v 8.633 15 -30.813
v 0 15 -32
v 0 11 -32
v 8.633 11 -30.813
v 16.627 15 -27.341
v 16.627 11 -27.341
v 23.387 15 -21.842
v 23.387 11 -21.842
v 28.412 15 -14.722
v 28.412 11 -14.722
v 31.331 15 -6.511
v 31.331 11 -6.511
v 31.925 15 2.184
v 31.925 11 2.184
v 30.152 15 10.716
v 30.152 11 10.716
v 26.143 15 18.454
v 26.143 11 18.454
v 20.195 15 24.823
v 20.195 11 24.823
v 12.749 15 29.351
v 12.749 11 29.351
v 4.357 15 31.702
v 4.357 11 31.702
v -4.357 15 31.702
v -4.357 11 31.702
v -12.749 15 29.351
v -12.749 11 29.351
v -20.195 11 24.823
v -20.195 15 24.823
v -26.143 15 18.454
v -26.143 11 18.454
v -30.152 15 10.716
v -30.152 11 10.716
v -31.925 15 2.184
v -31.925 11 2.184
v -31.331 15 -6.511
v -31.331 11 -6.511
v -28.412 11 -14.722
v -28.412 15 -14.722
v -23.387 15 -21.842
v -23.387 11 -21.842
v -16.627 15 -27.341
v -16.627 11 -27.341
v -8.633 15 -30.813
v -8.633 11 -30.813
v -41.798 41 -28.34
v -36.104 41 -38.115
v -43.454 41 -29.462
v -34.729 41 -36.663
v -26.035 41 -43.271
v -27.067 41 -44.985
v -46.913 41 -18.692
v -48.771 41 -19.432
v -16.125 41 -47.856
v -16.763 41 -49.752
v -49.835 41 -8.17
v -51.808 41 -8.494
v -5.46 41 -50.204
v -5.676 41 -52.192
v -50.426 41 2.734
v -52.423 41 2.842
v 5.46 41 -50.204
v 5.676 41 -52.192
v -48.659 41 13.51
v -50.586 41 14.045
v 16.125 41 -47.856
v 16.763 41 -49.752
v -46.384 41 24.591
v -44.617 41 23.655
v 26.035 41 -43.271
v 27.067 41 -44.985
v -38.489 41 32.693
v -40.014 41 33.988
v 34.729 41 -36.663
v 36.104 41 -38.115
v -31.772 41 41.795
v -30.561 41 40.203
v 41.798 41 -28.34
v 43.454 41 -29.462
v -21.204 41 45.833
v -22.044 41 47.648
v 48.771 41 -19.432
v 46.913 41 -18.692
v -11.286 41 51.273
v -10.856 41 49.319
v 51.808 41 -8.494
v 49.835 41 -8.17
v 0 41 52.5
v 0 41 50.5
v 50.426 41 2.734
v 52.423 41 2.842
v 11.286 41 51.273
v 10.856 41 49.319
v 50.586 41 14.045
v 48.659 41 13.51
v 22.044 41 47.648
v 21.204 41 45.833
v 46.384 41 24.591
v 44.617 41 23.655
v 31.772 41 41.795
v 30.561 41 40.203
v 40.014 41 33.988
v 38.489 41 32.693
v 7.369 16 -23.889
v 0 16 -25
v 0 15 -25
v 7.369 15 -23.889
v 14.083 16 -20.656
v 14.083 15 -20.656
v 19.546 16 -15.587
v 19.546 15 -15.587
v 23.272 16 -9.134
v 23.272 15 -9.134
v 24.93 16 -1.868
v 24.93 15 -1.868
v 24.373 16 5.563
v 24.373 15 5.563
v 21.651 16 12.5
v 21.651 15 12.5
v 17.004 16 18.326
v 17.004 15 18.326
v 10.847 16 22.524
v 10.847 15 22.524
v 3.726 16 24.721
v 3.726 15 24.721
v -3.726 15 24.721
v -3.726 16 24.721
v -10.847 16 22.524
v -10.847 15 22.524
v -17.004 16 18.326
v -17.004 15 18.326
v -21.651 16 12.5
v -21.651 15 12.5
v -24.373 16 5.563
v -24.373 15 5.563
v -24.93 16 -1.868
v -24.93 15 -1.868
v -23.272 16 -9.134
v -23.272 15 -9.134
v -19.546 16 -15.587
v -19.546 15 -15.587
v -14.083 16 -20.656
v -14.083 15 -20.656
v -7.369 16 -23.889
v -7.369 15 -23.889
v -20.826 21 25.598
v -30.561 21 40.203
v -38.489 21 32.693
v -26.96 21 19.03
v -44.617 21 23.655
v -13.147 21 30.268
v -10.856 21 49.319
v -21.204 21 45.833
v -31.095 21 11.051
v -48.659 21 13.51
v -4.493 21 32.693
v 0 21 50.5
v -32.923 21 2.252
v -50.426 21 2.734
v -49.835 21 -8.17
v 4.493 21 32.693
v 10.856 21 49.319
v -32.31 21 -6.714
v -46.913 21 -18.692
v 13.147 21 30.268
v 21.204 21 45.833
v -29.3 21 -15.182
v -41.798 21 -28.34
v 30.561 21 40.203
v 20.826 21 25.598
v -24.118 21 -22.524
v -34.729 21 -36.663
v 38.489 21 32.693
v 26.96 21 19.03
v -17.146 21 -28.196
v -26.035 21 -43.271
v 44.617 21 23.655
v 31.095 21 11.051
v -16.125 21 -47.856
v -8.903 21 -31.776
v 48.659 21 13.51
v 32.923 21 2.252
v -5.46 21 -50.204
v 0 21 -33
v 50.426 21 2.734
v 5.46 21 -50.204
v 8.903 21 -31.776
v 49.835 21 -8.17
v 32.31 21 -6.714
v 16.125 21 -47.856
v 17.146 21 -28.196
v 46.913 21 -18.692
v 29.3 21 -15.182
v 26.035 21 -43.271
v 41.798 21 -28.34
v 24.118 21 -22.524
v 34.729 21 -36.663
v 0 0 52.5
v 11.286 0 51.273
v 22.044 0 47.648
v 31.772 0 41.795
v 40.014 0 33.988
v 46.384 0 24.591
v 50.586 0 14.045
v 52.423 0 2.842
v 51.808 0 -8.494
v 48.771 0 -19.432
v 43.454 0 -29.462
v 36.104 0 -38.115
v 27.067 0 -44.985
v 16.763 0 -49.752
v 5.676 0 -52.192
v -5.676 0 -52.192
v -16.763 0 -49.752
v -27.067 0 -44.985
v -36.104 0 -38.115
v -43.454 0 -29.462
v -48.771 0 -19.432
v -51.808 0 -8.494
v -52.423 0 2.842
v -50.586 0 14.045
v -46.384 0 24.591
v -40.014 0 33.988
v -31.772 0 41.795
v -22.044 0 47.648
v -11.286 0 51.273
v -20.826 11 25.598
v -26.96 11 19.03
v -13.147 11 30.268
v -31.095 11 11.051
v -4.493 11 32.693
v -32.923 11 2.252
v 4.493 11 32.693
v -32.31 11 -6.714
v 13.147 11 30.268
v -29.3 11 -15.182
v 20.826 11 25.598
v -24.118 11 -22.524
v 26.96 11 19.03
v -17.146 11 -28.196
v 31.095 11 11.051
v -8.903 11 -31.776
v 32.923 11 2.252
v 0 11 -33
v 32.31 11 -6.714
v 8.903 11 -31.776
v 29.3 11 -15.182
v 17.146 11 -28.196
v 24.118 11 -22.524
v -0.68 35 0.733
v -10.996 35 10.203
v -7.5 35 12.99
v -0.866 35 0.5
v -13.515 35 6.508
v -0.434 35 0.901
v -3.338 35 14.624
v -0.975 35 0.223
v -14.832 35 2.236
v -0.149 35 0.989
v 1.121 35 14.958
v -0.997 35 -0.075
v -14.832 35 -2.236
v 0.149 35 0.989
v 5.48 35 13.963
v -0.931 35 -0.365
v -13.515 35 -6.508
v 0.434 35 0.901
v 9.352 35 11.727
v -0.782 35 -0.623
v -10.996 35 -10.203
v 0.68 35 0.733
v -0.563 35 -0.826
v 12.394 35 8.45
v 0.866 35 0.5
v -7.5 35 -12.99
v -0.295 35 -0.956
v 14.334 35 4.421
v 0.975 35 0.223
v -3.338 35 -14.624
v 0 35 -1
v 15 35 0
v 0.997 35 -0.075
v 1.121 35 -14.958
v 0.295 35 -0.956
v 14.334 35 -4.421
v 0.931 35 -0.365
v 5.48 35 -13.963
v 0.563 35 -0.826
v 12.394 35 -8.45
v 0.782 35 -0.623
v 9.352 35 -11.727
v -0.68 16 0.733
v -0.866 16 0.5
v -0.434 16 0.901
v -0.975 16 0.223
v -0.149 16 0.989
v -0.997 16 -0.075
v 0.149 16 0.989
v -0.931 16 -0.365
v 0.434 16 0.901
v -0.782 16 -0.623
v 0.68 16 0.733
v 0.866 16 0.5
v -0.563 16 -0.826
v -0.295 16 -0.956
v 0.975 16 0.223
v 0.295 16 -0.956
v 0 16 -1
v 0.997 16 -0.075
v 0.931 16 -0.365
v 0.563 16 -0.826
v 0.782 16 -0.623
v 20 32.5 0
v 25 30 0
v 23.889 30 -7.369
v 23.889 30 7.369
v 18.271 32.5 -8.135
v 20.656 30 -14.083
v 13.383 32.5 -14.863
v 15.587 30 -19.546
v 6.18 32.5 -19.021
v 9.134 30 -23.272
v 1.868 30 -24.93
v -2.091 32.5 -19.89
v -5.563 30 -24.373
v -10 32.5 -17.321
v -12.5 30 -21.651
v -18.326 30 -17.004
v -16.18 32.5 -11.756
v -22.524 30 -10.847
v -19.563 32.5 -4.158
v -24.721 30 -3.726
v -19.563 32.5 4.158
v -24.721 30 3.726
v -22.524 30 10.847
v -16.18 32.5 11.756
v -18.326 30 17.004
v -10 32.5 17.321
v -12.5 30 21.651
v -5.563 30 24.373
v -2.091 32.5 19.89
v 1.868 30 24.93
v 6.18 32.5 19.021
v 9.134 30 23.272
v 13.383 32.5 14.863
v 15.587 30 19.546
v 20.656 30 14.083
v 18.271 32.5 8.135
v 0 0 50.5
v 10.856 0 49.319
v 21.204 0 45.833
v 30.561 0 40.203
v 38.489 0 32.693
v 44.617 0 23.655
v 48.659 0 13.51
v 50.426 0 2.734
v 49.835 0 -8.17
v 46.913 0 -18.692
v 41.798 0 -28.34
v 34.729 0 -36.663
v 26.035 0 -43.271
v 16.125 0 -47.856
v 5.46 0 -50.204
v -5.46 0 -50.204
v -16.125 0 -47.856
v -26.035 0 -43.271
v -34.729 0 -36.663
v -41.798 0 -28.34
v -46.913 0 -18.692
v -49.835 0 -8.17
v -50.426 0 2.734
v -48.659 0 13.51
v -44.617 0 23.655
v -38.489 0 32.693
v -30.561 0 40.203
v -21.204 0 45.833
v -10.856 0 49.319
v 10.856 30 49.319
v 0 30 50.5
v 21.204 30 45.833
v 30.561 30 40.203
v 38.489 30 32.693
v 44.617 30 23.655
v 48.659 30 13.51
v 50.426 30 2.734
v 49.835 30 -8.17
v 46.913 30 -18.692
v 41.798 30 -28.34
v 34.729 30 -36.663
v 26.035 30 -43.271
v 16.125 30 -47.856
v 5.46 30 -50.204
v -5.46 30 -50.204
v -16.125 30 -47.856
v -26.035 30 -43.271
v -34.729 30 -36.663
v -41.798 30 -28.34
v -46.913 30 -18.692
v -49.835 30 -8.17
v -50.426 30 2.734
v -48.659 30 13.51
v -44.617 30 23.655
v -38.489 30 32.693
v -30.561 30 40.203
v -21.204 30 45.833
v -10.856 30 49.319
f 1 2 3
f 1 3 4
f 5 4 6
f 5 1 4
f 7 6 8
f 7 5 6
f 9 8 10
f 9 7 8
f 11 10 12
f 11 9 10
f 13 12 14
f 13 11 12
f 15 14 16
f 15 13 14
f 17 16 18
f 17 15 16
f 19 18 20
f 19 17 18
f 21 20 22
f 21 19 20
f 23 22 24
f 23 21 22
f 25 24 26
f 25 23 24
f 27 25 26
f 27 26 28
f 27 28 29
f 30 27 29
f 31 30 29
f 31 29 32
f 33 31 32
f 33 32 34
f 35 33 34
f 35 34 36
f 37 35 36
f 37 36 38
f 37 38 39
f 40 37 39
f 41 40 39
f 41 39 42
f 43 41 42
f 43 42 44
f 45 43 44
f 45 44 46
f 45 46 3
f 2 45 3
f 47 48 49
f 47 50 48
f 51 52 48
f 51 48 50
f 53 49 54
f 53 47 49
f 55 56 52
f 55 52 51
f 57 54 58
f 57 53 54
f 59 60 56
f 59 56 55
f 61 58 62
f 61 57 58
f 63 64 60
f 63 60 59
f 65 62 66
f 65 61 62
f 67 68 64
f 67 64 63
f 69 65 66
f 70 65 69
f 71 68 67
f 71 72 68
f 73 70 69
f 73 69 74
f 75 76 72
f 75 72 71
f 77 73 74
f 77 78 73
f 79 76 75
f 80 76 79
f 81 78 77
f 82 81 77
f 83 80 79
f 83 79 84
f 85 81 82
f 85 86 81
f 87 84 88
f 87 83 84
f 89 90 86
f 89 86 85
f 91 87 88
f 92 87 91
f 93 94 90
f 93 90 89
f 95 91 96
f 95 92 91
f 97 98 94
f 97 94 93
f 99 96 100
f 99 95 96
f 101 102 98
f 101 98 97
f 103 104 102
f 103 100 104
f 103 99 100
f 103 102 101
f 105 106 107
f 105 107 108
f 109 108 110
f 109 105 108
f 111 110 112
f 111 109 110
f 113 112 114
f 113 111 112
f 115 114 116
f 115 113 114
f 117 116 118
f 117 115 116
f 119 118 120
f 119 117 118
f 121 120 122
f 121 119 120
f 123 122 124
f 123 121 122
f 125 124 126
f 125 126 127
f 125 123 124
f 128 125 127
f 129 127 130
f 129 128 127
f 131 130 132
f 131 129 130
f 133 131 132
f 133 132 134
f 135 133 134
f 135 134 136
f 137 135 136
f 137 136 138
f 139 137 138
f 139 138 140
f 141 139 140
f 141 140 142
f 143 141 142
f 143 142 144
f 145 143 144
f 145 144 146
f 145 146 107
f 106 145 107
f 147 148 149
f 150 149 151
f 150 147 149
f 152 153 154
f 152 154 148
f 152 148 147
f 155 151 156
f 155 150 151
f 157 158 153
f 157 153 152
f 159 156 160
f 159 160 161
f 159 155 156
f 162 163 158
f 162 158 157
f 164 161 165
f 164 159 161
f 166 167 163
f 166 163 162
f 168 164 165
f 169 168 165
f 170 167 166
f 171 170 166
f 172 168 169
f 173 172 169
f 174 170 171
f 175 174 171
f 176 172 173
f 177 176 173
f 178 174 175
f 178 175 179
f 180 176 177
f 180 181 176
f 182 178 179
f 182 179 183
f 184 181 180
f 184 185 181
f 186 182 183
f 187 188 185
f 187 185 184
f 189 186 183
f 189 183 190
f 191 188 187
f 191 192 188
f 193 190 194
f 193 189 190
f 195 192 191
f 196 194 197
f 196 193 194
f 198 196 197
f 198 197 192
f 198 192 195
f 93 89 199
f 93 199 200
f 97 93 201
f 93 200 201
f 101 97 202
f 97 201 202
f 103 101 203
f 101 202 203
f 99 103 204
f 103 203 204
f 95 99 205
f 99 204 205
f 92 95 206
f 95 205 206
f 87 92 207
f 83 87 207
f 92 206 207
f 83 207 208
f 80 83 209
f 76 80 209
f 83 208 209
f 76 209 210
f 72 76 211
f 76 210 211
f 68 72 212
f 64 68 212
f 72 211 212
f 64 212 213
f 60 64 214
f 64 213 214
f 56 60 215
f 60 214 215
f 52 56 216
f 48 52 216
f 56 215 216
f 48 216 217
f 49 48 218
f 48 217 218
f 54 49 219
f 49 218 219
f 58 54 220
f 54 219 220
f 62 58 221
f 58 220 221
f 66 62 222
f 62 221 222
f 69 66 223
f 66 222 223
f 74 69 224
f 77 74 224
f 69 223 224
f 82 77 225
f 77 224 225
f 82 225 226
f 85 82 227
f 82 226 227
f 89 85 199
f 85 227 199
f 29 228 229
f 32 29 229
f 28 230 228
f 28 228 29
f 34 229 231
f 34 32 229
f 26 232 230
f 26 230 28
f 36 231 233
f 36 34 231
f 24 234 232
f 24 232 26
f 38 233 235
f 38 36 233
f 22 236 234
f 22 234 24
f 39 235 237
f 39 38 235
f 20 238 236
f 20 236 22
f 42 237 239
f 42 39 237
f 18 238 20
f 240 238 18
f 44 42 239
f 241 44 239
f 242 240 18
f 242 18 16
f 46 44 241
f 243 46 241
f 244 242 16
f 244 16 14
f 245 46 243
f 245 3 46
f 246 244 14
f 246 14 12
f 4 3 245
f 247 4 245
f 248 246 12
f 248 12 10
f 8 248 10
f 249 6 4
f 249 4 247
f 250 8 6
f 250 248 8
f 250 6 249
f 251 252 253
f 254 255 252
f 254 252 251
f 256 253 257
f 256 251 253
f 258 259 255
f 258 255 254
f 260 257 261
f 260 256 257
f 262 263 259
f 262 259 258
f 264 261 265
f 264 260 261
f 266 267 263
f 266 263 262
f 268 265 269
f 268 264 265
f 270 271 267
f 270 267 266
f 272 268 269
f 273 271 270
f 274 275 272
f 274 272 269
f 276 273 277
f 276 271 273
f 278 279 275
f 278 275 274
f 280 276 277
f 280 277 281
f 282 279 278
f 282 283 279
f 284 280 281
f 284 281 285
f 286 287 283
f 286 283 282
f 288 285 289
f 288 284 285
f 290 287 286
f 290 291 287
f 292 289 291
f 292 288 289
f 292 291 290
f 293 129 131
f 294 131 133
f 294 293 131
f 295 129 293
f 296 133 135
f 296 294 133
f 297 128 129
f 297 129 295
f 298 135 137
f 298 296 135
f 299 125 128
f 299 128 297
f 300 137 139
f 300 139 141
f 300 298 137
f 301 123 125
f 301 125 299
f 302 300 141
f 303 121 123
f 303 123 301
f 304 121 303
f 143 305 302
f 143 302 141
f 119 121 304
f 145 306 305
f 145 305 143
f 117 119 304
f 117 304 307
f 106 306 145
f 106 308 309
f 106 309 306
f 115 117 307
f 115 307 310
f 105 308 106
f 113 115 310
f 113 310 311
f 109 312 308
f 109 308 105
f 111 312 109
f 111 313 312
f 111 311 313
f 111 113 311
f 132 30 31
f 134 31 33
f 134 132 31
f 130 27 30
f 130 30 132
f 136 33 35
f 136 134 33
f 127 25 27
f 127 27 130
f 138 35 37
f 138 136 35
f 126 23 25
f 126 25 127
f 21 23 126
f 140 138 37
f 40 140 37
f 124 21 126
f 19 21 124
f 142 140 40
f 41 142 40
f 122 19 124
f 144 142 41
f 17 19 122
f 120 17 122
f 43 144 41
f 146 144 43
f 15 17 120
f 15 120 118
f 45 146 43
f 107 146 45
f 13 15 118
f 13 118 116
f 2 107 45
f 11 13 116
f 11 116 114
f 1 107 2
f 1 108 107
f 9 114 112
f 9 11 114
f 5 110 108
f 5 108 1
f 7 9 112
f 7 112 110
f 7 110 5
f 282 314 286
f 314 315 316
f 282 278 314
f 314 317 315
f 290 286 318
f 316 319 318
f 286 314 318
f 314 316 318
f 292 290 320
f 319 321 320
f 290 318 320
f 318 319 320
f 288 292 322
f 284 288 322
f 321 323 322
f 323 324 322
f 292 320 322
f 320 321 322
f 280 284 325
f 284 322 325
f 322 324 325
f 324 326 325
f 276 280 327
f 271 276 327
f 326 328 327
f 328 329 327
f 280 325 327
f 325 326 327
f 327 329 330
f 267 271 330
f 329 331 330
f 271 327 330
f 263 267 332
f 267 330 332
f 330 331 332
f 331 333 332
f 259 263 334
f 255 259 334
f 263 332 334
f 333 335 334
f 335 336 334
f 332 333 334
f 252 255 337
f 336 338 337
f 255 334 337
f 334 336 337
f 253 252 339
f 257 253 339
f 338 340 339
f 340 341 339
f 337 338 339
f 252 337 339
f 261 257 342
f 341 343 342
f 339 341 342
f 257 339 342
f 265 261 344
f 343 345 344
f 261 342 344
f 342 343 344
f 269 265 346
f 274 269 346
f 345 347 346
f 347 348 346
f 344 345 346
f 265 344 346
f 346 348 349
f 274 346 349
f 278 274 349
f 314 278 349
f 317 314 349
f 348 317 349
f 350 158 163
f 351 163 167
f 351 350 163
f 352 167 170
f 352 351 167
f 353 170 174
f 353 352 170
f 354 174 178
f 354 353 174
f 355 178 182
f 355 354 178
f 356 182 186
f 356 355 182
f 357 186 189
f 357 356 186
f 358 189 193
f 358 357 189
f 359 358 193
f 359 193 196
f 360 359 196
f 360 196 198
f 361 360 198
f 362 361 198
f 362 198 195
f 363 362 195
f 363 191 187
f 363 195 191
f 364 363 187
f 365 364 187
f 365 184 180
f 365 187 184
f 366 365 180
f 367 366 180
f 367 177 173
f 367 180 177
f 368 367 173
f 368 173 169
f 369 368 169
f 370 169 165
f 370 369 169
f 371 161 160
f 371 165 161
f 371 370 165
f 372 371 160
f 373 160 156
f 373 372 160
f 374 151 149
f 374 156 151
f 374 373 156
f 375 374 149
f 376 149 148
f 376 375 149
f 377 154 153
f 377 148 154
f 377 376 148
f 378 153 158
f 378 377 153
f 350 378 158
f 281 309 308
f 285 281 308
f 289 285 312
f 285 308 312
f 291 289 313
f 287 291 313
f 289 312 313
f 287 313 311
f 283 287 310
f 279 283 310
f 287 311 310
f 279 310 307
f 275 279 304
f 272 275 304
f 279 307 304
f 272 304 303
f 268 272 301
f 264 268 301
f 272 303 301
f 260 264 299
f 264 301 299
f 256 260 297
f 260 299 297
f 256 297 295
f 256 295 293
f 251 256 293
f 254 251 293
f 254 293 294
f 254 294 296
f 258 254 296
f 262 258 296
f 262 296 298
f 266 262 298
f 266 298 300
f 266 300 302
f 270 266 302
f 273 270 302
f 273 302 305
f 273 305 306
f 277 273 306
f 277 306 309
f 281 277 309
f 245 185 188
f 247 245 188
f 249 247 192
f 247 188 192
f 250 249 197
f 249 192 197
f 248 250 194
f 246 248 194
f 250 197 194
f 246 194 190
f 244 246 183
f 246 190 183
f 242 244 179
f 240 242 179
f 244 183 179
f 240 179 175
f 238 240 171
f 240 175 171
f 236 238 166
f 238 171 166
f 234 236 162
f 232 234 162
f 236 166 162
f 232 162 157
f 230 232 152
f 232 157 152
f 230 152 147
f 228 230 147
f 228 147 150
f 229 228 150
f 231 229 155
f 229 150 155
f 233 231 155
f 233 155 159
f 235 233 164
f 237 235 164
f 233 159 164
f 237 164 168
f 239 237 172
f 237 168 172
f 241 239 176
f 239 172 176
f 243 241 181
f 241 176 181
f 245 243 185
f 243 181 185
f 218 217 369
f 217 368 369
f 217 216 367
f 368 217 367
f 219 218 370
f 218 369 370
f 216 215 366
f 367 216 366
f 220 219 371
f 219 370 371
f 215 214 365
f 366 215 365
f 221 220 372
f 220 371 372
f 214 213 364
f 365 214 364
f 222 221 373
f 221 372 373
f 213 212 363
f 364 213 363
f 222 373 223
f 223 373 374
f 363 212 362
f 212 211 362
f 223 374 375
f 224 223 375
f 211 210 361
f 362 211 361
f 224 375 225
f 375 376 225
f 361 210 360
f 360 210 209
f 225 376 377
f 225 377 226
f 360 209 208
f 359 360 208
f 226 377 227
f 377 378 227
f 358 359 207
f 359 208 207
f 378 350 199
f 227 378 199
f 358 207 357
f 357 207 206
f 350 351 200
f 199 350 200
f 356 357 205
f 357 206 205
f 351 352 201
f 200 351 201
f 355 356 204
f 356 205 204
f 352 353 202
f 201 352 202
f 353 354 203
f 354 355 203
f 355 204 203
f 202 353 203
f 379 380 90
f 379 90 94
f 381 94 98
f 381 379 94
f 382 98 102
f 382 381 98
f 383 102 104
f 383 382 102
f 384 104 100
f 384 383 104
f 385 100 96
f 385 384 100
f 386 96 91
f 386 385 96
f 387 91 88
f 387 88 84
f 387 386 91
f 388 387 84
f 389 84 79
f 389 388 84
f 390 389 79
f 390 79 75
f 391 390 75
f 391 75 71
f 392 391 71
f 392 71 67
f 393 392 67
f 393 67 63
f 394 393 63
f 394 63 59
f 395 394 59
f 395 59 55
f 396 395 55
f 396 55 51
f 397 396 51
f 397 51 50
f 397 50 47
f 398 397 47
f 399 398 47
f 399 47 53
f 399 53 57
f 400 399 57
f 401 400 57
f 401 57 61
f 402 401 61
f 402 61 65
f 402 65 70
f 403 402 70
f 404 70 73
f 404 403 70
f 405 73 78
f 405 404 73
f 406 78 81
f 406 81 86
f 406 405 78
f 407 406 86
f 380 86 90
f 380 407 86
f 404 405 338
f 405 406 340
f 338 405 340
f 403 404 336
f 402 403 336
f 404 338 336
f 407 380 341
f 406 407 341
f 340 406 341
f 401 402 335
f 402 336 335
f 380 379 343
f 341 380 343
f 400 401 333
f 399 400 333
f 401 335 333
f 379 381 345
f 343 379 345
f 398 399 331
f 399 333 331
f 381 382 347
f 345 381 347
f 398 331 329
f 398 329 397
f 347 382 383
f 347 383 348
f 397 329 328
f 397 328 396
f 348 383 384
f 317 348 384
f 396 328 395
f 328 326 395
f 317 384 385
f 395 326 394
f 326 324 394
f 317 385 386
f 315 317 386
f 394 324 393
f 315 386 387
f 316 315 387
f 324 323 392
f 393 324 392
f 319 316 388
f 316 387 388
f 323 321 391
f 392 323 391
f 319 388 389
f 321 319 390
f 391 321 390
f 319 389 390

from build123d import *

# Parameters (mm, degrees)
SKETCH1_R                          = 52.5
SKETCH1_R_2                        = 50.5
MAIN_BLADE_CASE_EXTRUDE_DEPTH      = 41
SKETCH2_R                          = 50.5
EXTRUDE_FOR_GOBLET_TO_SIT_ON_DEPTH = 9
SKETCH5_R                          = 15
SKETCH4_R                          = 25
SKETCH8_R                          = 33
SKETCH8_R_2                        = 32
MAIN_LOWER_EXTRUDE_DEPTH           = 10
SKETCH9_R                          = 32
SKETCH9_R_2                        = 25
SECOND_LOWER_EXTRUDE_DEPTH         = 6
SKETCH12_R                         = 25
THIRD_LOWER_EXTRUDE_DEPTH          = 5
SKETCH13_R                         = 1
HOLE_FOR_SCREW_BLADE_CASING_DEPTH  = 89


with BuildPart() as part:
    # Sketch1 → Main Blade Case Extrude (new body)
    with BuildSketch(Plane(origin=(0, 0, 0), x_dir=(1, 0, 0), z_dir=(0, 1, 0))):
        with Locations(Location((0, 0, 0), (0, 0, 270))):
            Circle(SKETCH1_R)
        with Locations(Location((0, 0, 0), (0, 0, 270))):
            Circle(SKETCH1_R_2, mode=Mode.SUBTRACT)
    extrude(amount=MAIN_BLADE_CASE_EXTRUDE_DEPTH)

    # Sketch2 → Extrude for Goblet to Sit On (add)
    with BuildSketch(Plane(origin=(0, 21, 0), x_dir=(-1, 0, 0), z_dir=(0, -1, 0))):
        with Locations(Location((0, 0, 0), (0, 0, 90))):
            Circle(SKETCH2_R)
    extrude(amount=-EXTRUDE_FOR_GOBLET_TO_SIT_ON_DEPTH)

    # Sketch5 → Rounded Middle Section section 0
    with BuildSketch(Plane(origin=(0, 35, 0), x_dir=(1, 0, 0), z_dir=(0, 1, 0))):
        Circle(SKETCH5_R)
    # Sketch4 → Rounded Middle Section section 1
    with BuildSketch(Plane(origin=(0, 30, 0), x_dir=(1, 0, 0), z_dir=(0, 1, 0))):
        Circle(SKETCH4_R)
    loft()

    # Sketch8 → Main Lower Extrude (add)
    with BuildSketch(Plane.XZ.offset(-21)):
        with Locations(Location((0, 0, 0), (0, 0, 270))):
            Circle(SKETCH8_R)
        with Locations(Location((0, 0, 0), (0, 0, 270))):
            Circle(SKETCH8_R_2, mode=Mode.SUBTRACT)
    extrude(amount=MAIN_LOWER_EXTRUDE_DEPTH)

    # Sketch9 → Second Lower Extrude (add)
    with BuildSketch(Plane.XZ.offset(-21)):
        with Locations(Location((0, 0, 0), (0, 0, 270))):
            Circle(SKETCH9_R)
        with Locations(Location((0, 0, 0), (0, 0, 270))):
            Circle(SKETCH9_R_2, mode=Mode.SUBTRACT)
    extrude(amount=SECOND_LOWER_EXTRUDE_DEPTH)

    # Sketch12 → Third Lower Extrude (add)
    with BuildSketch(Plane(origin=(0, 21, 0), x_dir=(-1, 0, 0), z_dir=(0, -1, 0))):
        with Locations(Location((0, 0, 0), (0, 0, 90))):
            Circle(SKETCH12_R)
    extrude(amount=THIRD_LOWER_EXTRUDE_DEPTH)

    # Sketch13 → Hole for Screw (Blade Casing) (cut)
    with BuildSketch(Plane.XZ.offset(-16)):
        with Locations(Location((0, 0, 0), (0, 0, 270))):
            Circle(SKETCH13_R)
    extrude(amount=-HOLE_FOR_SCREW_BLADE_CASING_DEPTH, mode=Mode.SUBTRACT)


solid = part.part
